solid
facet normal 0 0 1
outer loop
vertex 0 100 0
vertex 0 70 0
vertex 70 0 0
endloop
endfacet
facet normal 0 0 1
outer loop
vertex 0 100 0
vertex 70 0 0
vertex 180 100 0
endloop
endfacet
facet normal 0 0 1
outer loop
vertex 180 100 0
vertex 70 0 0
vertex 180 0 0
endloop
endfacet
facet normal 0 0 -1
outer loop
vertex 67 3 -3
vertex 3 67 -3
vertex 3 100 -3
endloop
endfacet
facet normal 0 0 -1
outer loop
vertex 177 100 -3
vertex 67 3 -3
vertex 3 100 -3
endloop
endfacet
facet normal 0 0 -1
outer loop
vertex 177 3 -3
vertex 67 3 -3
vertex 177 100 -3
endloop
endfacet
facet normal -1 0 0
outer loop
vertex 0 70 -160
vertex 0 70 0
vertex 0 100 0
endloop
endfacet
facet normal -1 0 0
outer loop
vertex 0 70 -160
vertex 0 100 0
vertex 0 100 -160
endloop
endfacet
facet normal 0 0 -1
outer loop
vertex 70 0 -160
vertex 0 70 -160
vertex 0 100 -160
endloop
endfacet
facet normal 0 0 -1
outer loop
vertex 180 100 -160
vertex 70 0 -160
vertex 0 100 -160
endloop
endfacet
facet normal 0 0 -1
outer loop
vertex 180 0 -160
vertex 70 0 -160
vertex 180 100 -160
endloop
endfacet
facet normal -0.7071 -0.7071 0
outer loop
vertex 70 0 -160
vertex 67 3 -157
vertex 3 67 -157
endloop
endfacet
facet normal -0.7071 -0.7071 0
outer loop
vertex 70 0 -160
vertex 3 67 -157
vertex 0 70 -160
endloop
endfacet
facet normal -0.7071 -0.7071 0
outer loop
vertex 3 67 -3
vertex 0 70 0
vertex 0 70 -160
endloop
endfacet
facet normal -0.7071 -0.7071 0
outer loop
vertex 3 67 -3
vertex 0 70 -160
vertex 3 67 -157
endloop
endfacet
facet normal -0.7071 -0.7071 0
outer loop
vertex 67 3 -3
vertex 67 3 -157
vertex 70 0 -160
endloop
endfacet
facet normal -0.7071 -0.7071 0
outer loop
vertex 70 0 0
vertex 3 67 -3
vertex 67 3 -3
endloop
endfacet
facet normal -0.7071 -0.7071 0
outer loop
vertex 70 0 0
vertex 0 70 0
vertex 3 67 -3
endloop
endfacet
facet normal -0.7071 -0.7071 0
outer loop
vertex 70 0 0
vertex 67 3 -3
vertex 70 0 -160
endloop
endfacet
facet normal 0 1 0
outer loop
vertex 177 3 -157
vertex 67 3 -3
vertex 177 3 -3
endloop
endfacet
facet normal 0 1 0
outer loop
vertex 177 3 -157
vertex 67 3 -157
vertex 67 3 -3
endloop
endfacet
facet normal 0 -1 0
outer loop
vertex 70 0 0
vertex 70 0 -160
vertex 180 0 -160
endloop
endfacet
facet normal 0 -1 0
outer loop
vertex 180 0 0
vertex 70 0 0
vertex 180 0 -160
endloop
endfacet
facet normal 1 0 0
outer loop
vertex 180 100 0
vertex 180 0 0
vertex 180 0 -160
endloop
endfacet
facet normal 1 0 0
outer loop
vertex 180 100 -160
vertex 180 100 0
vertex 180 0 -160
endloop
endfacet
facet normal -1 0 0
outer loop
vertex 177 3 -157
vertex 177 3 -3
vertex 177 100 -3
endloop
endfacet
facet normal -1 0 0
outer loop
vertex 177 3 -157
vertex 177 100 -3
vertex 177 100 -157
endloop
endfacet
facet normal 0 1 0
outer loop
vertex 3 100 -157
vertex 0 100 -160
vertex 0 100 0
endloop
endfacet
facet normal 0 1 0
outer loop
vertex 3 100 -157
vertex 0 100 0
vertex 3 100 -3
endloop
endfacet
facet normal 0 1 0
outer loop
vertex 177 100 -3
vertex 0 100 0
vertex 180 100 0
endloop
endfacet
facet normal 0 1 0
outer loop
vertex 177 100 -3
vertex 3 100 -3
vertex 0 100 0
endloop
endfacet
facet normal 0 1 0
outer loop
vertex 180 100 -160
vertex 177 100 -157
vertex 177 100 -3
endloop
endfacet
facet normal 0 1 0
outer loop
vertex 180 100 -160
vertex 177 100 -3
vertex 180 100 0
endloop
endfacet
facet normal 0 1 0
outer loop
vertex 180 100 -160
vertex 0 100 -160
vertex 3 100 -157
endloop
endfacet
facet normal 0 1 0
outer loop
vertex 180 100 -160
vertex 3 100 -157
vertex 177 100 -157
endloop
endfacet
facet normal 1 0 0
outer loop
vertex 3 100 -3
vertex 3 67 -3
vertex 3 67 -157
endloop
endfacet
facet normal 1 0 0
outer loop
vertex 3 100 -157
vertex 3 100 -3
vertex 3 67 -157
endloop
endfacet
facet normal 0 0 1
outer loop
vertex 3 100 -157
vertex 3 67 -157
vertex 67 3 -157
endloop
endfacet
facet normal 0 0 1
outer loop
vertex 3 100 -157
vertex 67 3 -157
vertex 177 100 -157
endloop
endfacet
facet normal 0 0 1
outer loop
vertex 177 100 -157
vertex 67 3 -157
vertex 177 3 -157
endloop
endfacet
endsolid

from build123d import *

# Parameters (mm, degrees)
SKETCH1_W               = 180
SKETCH1_H               = 160
BOSS_EXTRUDE1_DEPTH     = 3
SKETCH2_W               = 180
SKETCH2_H               = 160
SKETCH2_W_2             = 174
SKETCH2_H_2             = 154
BOSS_EXTRUDE2_DEPTH     = 100
CUT_EXTRUDE1_DEPTH      = 1
CUT_EXTRUDE1_DEPTH_BACK = 161


with BuildPart() as part:
    # Sketch1 → Boss-Extrude1 (new body)
    with BuildSketch(Plane(origin=(0, 0, 0), x_dir=(1, 0, 0), z_dir=(0, 1, 0))):
        with Locations((90, 80)):
            Rectangle(SKETCH1_W, SKETCH1_H)
    extrude(amount=BOSS_EXTRUDE1_DEPTH)

    # Sketch2 → Boss-Extrude2 (add)
    with BuildSketch(Plane(origin=(0, 0, 0), x_dir=(1, 0, 0), z_dir=(0, 1, 0))):
        with Locations((90, 80)):
            Rectangle(SKETCH2_W, SKETCH2_H)
        with Locations((90, 80)):
            Rectangle(SKETCH2_W_2, SKETCH2_H_2, mode=Mode.SUBTRACT)
    extrude(amount=BOSS_EXTRUDE2_DEPTH)

    # Sketch3 → Cut-Extrude1 (cut, two sides)
    with BuildSketch(Plane.XY) as cut_extrude1_sk:
        Polygon((0, 70), (70, 0), (0, 0), align=None)
    extrude(amount=CUT_EXTRUDE1_DEPTH, mode=Mode.SUBTRACT)
    extrude(cut_extrude1_sk.sketch, amount=-CUT_EXTRUDE1_DEPTH_BACK, mode=Mode.SUBTRACT)


solid = part.part
